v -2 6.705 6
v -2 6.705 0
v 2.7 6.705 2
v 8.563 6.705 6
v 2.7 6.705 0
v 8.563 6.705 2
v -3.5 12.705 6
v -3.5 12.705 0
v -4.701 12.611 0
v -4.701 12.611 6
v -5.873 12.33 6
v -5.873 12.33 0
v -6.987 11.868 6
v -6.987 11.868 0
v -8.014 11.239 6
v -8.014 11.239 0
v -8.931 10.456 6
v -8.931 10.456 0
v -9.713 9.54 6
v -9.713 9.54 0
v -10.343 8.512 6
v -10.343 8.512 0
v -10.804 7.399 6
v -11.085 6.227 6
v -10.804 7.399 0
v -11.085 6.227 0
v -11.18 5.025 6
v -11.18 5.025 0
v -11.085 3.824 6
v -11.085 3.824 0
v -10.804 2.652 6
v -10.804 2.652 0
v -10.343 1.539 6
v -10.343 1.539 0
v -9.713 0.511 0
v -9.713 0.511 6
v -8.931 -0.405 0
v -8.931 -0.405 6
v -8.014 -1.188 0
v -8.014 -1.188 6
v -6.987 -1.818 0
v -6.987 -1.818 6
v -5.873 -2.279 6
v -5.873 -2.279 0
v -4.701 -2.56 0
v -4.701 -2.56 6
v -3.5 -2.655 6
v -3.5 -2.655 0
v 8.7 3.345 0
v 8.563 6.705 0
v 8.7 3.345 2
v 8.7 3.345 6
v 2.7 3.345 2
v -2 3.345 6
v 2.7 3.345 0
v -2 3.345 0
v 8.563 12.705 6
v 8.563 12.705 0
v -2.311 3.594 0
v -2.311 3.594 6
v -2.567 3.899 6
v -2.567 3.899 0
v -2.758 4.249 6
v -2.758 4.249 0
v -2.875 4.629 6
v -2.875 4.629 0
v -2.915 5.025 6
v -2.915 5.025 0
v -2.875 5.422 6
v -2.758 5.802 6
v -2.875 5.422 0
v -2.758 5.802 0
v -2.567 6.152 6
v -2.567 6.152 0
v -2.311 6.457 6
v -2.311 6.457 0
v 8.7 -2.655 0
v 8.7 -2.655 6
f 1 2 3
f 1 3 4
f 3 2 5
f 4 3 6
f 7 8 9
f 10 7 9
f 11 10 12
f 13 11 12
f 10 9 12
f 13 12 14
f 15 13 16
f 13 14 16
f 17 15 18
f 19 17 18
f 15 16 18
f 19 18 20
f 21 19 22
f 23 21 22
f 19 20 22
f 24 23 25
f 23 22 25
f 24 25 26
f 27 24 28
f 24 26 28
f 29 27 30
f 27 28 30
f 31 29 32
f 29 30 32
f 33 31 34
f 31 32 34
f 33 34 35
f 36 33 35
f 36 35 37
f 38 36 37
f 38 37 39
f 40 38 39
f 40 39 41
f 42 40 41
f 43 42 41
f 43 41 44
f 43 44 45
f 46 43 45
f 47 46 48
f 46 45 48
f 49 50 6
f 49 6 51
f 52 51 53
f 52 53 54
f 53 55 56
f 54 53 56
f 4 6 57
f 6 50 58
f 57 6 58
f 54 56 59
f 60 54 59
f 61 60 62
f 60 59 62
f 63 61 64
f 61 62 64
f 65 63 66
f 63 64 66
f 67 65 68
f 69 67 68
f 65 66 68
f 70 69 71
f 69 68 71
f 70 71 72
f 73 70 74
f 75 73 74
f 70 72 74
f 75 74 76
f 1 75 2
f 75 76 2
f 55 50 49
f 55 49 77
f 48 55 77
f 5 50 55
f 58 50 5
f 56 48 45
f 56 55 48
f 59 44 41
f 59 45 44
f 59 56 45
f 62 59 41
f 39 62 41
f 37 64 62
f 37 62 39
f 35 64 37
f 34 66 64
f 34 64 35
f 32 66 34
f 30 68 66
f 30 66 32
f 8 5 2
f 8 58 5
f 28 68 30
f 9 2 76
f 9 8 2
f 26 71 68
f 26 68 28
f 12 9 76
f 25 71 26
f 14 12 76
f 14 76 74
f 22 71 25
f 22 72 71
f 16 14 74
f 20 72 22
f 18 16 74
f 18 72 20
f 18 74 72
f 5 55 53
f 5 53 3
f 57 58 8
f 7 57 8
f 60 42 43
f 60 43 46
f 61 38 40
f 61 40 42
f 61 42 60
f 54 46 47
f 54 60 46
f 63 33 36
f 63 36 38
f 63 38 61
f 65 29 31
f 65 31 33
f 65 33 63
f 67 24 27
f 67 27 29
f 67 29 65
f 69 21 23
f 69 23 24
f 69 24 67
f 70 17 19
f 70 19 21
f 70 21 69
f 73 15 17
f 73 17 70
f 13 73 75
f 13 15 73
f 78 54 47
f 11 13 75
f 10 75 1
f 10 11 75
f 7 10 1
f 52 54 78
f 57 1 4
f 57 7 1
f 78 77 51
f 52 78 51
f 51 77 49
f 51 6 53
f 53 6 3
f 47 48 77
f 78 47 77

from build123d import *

# Parameters (mm, degrees)
BOSS_EXTRUDE1_DEPTH = 6
BOSS_EXTRUDE2_DEPTH = 2


with BuildPart() as part:
    # Sketch1 → Boss-Extrude1 (new body)
    with BuildSketch(Plane.XY):
        with BuildLine():
            Line((-2, 6.705426357), (2, 6.705426357))
            Line((2, 6.705426357), (8.562541674, 6.705426357))
            Line((8.562541674, 6.705426357), (8.562541674, 12.705426357))
            Line((8.562541674, 12.705426357), (3.5, 12.705426357))
            Line((3.5, 12.705426357), (-3.5, 12.705426357))
            ThreePointArc((-3.5, 12.705426357), (-11.18, 5.025426357), (-3.5, -2.654573643))
            Line((-3.5, -2.654573643), (3.5, -2.654573643))
            Line((3.5, -2.654573643), (8.700403781, -2.654573643))
            Line((8.700403781, -2.654573643), (8.700403781, 3.345426357))
            Line((8.700403781, 3.345426357), (2, 3.345426357))
            Line((2, 3.345426357), (-2, 3.345426357))
            ThreePointArc((-2, 3.345426357), (-2.914827203, 5.025426357), (-2, 6.705426357))
        make_face()
    extrude(amount=BOSS_EXTRUDE1_DEPTH)

    # Sketch2 → Boss-Extrude2 (add)
    with BuildSketch(Plane.XY):
        Polygon((8.562541674, 6.705426357), (8.700403781, 3.345426357), (2.7, 3.345426357), (2.7, 6.705426357), align=None)
    extrude(amount=BOSS_EXTRUDE2_DEPTH)


solid = part.part
